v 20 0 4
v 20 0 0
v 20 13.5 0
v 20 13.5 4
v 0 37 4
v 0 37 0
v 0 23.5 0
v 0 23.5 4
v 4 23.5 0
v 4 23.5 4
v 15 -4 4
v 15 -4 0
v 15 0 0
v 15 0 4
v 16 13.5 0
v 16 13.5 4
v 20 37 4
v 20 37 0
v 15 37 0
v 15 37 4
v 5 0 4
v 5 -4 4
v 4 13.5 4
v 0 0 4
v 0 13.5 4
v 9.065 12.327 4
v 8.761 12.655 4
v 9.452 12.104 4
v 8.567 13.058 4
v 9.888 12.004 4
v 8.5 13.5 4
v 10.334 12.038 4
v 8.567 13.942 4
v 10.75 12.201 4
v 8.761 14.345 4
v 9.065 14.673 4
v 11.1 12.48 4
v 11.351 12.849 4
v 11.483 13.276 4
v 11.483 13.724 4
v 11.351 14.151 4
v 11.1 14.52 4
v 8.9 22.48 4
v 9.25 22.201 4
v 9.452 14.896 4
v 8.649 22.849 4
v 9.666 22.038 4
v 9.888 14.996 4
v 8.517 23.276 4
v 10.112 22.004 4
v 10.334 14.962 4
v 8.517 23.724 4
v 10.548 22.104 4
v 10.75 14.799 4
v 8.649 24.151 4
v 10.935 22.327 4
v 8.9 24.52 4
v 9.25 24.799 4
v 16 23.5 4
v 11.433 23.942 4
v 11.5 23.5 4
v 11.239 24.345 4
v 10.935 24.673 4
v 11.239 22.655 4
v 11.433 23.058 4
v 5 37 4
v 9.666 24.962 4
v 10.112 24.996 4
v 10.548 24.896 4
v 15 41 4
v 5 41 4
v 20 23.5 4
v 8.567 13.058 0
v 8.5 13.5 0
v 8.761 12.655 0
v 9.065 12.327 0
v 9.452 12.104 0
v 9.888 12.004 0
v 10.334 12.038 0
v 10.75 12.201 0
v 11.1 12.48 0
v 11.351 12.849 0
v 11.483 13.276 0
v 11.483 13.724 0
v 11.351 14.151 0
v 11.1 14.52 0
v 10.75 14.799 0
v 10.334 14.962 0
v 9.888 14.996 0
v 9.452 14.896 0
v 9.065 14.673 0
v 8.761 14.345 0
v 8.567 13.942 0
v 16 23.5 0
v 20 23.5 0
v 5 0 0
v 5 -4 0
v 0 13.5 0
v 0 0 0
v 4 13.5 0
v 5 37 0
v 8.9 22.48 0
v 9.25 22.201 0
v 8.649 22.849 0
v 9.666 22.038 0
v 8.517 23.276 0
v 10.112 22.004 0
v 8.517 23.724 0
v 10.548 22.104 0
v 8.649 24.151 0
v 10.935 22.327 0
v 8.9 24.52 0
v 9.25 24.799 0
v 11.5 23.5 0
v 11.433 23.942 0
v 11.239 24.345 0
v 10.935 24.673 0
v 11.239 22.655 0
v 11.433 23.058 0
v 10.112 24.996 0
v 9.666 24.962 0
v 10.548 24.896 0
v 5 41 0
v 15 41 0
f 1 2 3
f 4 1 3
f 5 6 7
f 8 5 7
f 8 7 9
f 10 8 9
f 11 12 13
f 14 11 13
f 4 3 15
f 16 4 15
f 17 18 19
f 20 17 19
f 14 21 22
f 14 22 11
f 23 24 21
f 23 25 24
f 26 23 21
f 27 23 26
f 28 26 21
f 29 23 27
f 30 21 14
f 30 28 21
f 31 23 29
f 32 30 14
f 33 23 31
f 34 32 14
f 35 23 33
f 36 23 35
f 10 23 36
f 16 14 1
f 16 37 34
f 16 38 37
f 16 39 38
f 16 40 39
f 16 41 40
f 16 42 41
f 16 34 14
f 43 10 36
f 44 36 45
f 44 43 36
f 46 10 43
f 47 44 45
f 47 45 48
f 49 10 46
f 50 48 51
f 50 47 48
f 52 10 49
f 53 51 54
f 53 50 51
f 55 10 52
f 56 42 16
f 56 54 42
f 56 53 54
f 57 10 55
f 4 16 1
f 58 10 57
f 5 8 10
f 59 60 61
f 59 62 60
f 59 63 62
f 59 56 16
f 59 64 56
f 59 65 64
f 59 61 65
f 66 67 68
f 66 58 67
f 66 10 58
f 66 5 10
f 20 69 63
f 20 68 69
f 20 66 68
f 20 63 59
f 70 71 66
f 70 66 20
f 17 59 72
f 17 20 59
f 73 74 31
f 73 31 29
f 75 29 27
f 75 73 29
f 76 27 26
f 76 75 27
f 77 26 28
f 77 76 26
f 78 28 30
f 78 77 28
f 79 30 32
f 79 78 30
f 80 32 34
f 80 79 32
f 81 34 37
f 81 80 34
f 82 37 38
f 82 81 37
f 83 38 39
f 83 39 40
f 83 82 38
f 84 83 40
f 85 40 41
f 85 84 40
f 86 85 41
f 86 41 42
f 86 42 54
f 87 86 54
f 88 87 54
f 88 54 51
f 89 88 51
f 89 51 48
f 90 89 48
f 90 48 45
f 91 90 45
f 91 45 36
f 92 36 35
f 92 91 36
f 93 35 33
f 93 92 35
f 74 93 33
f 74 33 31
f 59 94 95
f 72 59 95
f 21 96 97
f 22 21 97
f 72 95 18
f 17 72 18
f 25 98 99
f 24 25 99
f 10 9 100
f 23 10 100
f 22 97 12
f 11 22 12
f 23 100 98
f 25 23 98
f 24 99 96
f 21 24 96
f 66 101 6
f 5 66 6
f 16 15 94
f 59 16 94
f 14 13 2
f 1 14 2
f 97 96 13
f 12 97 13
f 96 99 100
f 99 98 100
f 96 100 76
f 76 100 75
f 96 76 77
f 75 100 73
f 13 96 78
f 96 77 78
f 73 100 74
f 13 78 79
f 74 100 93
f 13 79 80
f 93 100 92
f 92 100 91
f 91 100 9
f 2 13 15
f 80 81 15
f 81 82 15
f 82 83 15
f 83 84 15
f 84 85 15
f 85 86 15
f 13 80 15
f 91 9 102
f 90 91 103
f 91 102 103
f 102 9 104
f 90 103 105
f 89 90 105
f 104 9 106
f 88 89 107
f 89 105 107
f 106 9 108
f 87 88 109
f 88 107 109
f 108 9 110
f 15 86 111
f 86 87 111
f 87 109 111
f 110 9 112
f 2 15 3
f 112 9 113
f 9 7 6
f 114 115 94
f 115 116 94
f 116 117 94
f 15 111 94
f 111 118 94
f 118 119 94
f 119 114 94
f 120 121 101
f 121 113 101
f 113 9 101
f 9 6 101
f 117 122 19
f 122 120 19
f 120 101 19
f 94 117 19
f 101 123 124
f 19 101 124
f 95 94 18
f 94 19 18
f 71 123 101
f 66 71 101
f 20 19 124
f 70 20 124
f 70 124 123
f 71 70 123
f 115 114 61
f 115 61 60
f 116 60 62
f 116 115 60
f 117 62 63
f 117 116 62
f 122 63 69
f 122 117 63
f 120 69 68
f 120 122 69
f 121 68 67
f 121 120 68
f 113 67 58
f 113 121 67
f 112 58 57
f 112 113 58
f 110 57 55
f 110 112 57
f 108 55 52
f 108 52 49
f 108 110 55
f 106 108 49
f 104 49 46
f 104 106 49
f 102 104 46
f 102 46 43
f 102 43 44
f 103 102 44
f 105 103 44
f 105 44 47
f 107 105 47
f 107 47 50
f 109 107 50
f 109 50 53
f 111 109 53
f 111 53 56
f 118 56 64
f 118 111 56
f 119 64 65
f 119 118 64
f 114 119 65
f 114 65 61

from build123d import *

# Parameters (mm, degrees)
SKETCH_1_R      = 1.5
EXTRUDE_1_DEPTH = 4


with BuildPart() as part:
    # Эскиз1 → Бобышка-Вытянуть1 (new body)
    with BuildSketch(Plane.XY):
        Polygon((0, 0), (5, 0), (5, -4), (15, -4), (15, 0), (20, 0), (20, 13.5), (16, 13.5), (16, 23.5), (20, 23.5), (20, 37), (15, 37), (15, 41), (5, 41), (5, 37), (0, 37), (0, 23.5), (4, 23.5), (4, 13.5), (0, 13.5), align=None)
        with Locations((10, 23.5)):
            Circle(SKETCH_1_R, mode=Mode.SUBTRACT)
        with Locations(Location((10, 13.5, 0), (0, 0, 180))):
            Circle(SKETCH_1_R, mode=Mode.SUBTRACT)
    extrude(amount=EXTRUDE_1_DEPTH)


solid = part.part
